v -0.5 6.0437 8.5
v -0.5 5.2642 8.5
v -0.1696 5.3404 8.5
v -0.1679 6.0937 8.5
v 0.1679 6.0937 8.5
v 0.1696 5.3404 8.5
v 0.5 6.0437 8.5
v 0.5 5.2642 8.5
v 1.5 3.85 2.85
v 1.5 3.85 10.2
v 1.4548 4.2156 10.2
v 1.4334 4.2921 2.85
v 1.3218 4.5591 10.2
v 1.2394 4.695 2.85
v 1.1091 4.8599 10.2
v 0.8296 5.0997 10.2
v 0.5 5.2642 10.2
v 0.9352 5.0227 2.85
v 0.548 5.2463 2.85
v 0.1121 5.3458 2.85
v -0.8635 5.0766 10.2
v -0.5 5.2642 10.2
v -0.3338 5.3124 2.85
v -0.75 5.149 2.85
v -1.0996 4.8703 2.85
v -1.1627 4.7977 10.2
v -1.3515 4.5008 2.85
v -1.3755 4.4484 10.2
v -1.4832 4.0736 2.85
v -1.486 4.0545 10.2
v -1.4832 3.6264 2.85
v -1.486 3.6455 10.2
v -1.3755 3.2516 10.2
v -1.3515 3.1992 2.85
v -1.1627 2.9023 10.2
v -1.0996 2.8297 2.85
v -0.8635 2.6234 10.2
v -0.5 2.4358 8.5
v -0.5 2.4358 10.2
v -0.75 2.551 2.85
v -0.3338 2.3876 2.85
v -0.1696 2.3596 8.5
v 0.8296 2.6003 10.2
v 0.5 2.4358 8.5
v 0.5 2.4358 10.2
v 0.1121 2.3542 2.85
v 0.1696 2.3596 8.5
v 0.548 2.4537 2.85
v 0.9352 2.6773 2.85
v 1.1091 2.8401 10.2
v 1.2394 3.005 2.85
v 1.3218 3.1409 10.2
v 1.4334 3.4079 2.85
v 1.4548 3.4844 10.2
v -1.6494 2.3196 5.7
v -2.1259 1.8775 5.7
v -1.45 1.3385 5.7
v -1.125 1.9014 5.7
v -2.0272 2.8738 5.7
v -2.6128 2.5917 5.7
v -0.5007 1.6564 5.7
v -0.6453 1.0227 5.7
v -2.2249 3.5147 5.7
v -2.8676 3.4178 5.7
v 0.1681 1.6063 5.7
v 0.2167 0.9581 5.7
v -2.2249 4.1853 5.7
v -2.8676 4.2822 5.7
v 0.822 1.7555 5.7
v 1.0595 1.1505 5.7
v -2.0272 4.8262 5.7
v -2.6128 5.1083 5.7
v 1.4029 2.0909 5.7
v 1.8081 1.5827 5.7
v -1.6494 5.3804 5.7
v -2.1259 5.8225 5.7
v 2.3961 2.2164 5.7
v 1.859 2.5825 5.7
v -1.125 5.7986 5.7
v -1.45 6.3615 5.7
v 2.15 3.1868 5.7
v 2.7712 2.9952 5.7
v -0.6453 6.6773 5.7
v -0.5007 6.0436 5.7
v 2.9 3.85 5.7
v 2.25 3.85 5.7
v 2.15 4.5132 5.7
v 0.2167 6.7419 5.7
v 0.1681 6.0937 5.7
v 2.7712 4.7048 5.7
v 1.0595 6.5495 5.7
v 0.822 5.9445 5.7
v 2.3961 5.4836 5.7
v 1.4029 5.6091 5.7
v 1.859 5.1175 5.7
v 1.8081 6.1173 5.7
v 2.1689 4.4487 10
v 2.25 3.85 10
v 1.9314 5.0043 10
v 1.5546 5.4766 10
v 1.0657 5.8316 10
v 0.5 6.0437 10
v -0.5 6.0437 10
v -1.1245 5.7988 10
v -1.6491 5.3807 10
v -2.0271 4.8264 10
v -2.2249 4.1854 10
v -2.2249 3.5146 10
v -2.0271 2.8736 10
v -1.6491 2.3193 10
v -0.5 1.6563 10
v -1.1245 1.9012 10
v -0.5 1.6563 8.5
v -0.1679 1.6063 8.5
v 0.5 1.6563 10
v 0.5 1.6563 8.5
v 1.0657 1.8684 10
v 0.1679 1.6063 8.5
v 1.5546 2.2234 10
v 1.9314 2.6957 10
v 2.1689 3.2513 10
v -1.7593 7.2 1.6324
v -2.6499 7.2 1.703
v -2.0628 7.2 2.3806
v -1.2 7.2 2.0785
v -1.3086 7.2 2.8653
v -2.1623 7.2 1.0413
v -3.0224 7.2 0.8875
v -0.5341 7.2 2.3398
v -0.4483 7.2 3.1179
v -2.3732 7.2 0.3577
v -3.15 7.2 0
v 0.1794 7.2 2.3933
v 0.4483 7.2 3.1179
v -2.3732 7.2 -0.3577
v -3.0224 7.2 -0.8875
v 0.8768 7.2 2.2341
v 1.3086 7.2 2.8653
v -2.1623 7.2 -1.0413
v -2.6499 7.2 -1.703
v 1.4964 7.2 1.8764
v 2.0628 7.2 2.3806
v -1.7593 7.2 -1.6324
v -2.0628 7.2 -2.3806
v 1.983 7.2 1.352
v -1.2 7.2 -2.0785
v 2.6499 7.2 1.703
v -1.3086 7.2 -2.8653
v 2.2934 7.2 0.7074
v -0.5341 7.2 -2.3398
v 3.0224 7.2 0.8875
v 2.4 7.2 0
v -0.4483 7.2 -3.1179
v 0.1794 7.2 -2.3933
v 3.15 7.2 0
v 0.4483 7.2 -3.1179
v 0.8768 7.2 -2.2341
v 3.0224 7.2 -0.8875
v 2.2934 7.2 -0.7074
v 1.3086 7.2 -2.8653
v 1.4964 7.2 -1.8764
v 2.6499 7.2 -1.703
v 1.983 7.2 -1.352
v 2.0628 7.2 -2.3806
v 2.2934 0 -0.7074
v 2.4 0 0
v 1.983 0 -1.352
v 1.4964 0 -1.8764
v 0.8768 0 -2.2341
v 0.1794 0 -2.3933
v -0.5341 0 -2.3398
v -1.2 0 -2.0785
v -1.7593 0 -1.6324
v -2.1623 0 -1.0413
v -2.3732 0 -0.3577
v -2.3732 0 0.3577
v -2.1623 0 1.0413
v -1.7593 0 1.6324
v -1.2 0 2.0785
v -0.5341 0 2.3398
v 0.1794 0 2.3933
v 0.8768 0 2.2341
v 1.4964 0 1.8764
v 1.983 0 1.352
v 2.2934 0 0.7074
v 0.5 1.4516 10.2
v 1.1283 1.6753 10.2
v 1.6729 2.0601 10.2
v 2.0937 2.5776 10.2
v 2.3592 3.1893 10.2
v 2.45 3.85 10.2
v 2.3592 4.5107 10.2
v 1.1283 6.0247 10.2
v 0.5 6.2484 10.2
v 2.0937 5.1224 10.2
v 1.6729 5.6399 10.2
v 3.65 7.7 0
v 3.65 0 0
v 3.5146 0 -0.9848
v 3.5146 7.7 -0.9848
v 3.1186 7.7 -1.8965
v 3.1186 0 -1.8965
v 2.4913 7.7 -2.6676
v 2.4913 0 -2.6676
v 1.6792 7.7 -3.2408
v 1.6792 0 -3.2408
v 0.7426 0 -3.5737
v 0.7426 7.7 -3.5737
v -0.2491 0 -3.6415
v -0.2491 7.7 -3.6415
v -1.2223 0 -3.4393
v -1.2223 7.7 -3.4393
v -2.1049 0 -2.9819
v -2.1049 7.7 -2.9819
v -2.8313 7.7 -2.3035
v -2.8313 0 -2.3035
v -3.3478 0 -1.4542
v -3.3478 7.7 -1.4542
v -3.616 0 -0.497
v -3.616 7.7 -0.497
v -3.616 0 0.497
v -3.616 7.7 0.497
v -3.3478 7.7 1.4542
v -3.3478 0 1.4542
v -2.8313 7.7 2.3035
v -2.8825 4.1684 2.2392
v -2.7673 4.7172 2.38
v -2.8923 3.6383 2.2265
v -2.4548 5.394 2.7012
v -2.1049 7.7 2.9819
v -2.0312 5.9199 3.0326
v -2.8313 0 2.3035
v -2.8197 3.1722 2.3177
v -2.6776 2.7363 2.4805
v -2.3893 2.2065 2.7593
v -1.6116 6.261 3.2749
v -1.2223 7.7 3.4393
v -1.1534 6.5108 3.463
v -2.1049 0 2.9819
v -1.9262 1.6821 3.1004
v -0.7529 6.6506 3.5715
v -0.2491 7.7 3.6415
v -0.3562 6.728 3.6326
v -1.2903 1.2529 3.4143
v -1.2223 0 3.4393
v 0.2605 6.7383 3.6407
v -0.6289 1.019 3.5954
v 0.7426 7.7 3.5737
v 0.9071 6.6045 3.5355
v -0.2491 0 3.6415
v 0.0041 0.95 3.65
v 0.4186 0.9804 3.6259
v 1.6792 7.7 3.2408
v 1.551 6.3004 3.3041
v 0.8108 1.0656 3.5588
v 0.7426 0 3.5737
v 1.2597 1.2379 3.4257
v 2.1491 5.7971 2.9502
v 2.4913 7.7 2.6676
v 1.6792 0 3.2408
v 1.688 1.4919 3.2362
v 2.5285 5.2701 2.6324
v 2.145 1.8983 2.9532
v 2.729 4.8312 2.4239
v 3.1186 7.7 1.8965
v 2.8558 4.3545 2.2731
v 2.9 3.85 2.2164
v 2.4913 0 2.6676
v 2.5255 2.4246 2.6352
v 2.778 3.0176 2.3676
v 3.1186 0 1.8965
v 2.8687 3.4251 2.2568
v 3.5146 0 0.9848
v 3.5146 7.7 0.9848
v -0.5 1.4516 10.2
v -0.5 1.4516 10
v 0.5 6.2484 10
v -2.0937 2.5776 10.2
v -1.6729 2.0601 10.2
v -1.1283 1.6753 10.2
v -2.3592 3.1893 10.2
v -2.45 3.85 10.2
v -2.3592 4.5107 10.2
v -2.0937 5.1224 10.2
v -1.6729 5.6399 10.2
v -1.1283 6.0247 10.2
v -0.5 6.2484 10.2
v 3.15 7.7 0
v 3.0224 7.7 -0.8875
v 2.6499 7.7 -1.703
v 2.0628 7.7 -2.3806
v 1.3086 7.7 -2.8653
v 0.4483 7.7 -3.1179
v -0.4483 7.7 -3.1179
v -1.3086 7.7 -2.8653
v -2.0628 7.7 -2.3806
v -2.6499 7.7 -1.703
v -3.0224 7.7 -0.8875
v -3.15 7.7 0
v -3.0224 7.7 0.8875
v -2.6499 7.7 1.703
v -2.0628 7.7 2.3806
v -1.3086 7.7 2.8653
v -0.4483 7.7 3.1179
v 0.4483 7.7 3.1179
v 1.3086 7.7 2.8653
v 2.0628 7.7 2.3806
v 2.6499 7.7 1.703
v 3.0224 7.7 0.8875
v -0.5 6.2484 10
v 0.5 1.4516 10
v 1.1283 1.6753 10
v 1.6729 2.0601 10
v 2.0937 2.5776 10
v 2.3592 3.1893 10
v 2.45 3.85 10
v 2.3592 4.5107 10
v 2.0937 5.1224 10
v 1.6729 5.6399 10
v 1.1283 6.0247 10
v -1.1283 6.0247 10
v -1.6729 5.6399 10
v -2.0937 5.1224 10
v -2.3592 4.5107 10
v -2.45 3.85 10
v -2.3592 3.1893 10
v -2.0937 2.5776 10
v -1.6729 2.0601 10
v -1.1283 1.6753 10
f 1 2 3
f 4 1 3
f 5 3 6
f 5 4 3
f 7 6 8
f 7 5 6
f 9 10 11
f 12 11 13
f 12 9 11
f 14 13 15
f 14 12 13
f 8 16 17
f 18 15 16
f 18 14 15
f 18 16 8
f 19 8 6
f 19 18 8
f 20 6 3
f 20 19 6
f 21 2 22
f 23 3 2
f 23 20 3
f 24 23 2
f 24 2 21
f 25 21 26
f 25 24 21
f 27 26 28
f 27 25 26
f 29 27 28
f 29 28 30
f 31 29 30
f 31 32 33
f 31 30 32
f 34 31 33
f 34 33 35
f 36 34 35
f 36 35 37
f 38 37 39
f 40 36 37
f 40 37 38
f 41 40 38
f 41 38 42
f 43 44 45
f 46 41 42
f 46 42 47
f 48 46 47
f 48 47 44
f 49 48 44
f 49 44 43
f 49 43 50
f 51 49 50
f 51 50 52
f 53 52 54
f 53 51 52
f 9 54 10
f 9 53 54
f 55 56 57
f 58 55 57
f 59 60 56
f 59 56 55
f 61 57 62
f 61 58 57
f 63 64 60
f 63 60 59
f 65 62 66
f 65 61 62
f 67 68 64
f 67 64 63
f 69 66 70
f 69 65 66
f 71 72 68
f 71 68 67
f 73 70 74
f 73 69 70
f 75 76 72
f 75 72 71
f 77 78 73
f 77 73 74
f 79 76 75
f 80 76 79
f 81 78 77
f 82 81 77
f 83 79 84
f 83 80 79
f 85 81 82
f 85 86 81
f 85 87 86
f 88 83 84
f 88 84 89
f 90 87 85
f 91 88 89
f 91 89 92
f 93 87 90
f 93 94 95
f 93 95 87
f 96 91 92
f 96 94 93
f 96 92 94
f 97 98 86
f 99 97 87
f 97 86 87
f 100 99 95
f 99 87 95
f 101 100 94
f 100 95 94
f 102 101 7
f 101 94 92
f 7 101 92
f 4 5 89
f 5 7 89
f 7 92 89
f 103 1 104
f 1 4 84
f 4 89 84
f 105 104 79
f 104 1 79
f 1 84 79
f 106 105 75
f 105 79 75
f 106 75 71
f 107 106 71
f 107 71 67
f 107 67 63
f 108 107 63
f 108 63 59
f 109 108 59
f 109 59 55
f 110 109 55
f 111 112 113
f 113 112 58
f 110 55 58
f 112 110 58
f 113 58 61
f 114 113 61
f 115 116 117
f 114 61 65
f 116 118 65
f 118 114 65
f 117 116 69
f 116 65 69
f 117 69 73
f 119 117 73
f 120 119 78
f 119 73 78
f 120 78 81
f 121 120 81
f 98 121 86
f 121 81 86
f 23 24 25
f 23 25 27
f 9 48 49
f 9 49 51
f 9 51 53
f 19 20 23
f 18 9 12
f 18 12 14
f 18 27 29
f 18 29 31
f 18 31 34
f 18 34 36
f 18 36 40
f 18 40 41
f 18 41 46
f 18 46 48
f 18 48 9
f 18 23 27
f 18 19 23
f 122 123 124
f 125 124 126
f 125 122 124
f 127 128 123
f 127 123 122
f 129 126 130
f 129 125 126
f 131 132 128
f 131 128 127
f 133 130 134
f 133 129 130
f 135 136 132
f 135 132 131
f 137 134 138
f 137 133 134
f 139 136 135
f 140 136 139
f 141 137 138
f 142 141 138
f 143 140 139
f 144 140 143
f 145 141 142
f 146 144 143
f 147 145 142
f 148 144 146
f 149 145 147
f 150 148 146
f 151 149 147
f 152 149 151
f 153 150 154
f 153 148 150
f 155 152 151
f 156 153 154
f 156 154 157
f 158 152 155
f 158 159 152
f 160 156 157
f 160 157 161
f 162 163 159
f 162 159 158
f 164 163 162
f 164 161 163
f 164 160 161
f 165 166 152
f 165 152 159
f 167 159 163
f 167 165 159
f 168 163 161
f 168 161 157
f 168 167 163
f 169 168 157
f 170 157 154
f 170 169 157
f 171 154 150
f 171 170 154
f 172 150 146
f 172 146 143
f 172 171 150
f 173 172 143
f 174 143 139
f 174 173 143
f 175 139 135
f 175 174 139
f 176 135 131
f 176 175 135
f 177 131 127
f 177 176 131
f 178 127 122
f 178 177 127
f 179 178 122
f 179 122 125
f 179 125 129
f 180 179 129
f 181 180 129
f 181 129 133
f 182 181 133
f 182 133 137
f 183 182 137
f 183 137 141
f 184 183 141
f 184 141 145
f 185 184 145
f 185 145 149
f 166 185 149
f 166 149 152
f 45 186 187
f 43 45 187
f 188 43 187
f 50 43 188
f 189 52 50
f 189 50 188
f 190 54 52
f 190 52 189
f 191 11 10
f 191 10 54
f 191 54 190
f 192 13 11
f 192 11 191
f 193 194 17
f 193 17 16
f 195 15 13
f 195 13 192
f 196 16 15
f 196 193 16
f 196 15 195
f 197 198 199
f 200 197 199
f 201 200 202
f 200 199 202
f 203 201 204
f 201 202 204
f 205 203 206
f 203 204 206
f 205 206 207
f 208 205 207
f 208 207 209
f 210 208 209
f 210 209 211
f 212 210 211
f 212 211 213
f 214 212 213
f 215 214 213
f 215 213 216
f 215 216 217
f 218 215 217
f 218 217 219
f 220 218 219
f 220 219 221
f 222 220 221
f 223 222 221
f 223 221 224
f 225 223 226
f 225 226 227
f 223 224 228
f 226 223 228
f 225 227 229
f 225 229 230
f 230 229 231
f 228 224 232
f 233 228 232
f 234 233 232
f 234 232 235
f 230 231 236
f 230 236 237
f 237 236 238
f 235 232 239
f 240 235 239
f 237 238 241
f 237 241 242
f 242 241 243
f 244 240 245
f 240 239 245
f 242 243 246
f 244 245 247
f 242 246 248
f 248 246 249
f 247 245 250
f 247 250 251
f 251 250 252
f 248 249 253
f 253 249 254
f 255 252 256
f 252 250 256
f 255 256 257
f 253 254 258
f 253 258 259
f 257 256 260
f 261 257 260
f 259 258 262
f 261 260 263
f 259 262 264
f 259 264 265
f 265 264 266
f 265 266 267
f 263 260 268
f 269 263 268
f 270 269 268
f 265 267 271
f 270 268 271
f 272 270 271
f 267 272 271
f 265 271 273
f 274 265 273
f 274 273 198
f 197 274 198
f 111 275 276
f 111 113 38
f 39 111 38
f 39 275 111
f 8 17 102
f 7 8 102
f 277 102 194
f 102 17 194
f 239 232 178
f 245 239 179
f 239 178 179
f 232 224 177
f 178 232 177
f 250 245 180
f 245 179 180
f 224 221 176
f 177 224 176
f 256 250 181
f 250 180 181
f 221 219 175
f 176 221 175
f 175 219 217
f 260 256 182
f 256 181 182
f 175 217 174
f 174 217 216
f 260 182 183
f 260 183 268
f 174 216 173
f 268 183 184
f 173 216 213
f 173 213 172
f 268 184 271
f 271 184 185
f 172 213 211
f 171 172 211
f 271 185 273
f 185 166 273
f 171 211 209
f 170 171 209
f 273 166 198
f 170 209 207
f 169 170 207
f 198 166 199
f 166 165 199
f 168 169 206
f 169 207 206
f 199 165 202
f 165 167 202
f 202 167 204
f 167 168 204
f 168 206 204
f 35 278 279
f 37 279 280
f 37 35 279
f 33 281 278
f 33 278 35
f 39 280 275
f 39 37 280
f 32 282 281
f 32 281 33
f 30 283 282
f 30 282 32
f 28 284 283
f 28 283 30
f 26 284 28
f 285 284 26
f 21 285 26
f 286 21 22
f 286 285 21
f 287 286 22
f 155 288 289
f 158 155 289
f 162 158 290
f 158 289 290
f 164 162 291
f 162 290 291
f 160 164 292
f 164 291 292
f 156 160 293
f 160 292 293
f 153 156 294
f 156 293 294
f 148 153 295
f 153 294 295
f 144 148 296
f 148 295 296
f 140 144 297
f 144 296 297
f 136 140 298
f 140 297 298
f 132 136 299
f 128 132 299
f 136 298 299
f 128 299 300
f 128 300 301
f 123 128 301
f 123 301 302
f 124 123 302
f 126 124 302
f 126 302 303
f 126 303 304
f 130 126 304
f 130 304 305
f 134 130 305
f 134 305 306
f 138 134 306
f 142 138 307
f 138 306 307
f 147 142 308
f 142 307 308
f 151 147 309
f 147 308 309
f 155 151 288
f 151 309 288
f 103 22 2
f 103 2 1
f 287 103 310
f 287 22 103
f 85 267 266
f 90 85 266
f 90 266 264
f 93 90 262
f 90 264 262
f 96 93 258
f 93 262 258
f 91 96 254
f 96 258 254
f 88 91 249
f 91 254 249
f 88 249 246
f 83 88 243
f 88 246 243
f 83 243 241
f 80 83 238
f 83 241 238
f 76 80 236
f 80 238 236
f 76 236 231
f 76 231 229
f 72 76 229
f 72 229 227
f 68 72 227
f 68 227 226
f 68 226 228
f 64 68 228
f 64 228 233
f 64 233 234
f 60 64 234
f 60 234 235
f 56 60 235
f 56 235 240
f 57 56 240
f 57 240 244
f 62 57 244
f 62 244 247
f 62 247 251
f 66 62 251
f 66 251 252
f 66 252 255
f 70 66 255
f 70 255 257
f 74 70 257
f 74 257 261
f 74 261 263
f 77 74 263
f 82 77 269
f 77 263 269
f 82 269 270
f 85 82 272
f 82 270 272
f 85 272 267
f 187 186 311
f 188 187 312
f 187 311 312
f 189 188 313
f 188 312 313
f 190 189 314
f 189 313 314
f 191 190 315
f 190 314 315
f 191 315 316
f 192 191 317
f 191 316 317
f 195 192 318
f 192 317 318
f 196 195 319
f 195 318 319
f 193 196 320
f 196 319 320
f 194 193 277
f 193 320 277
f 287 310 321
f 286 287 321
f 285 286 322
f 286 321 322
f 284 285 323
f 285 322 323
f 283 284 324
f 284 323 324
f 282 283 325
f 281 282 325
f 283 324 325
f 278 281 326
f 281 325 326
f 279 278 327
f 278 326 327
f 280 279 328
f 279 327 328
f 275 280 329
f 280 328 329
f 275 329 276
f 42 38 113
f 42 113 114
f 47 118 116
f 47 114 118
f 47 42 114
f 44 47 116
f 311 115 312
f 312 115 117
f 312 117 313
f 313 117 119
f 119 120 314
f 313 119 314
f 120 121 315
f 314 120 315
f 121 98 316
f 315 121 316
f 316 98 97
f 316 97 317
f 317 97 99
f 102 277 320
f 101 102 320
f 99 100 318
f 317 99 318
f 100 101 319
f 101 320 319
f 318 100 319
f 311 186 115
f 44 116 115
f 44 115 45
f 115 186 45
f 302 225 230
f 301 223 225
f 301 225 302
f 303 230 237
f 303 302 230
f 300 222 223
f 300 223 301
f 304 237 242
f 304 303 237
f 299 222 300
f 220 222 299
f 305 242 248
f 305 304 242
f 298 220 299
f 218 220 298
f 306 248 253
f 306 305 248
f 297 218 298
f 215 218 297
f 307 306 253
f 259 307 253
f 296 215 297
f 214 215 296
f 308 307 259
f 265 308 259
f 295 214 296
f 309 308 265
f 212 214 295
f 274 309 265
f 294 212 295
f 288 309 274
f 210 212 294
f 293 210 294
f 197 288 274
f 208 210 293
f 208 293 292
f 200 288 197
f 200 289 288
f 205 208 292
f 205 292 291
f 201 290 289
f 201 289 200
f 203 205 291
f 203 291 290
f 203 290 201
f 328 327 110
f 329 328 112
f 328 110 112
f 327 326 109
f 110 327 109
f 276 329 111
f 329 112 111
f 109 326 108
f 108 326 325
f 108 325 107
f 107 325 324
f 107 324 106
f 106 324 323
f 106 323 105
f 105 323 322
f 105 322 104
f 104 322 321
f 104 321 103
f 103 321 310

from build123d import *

# Parameters (mm, degrees)
SKETCH1_R           = 3.65
SKETCH1_R_2         = 2.4
BOSS_EXTRUDE1_DEPTH = 7.7
SKETCH2_R           = 3.15
SKETCH2_R_2         = 2.4
CUT_EXTRUDE1_DEPTH  = 0.5
SKETCH4_R           = 2.9
BOSS_EXTRUDE2_DEPTH = 5.7
SKETCH5_R           = 2.25
BOSS_EXTRUDE3_DEPTH = 10.2
SKETCH8_R           = 2.4
CUT_EXTRUDE5_DEPTH  = 8.2000001
SKETCH14_R          = 2.45
SKETCH14_R_2        = 2.25
BOSS_EXTRUDE5_DEPTH = 0.2
SKETCH10_R          = 1.5
CUT_EXTRUDE6_DEPTH  = 8.35
SKETCH7_W           = 1
SKETCH7_H           = 5.978668982
CUT_EXTRUDE7_DEPTH  = 1.7


with BuildPart() as part:
    # Sketch1 → Boss-Extrude1 (new body)
    with BuildSketch(Plane(origin=(0, 0, 0), x_dir=(1, 0, 0), z_dir=(0, 1, 0))):
        Circle(SKETCH1_R)
        Circle(SKETCH1_R_2, mode=Mode.SUBTRACT)
    extrude(amount=BOSS_EXTRUDE1_DEPTH)

    # Sketch2 → Cut-Extrude1 (cut)
    with BuildSketch(Plane(origin=(0, 7.7, 0), x_dir=(1, 0, 0), z_dir=(0, 1, 0))):
        Circle(SKETCH2_R)
        Circle(SKETCH2_R_2, mode=Mode.SUBTRACT)
    extrude(amount=-CUT_EXTRUDE1_DEPTH, mode=Mode.SUBTRACT)

    # Sketch4 → Boss-Extrude2 (add)
    with BuildSketch(Plane.XY):
        with Locations((0, 3.85)):
            Circle(SKETCH4_R)
    extrude(amount=BOSS_EXTRUDE2_DEPTH)

    # Sketch5 → Boss-Extrude3 (add)
    with BuildSketch(Plane.XY):
        with Locations((0, 3.85)):
            Circle(SKETCH5_R)
    extrude(amount=BOSS_EXTRUDE3_DEPTH)

    # Sketch8 → Cut-Extrude5 (cut, through all)
    with BuildSketch(Plane(origin=(0, 7.2, 0), x_dir=(1, 0, 0), z_dir=(0, 1, 0))):
        Circle(SKETCH8_R)
    extrude(amount=-CUT_EXTRUDE5_DEPTH, mode=Mode.SUBTRACT)

    # Sketch14 → Boss-Extrude5 (add)
    with BuildSketch(Plane.XY.offset(10)):
        with Locations((0, 3.85)):
            Circle(SKETCH14_R)
        with Locations((0, 3.85)):
            Circle(SKETCH14_R_2, mode=Mode.SUBTRACT)
    extrude(amount=BOSS_EXTRUDE5_DEPTH)

    # Sketch10 → Cut-Extrude6 (cut, through all)
    with BuildSketch(Plane.XY.offset(2.85)):
        with Locations((0, 3.85)):
            Circle(SKETCH10_R)
    extrude(amount=CUT_EXTRUDE6_DEPTH, mode=Mode.SUBTRACT)

    # Sketch7 → Cut-Extrude7 (cut)
    with BuildSketch(Plane.XY.offset(10.2)):
        with Locations((0, 3.85)):
            Rectangle(SKETCH7_W, SKETCH7_H)
    extrude(amount=-CUT_EXTRUDE7_DEPTH, mode=Mode.SUBTRACT)


solid = part.part
